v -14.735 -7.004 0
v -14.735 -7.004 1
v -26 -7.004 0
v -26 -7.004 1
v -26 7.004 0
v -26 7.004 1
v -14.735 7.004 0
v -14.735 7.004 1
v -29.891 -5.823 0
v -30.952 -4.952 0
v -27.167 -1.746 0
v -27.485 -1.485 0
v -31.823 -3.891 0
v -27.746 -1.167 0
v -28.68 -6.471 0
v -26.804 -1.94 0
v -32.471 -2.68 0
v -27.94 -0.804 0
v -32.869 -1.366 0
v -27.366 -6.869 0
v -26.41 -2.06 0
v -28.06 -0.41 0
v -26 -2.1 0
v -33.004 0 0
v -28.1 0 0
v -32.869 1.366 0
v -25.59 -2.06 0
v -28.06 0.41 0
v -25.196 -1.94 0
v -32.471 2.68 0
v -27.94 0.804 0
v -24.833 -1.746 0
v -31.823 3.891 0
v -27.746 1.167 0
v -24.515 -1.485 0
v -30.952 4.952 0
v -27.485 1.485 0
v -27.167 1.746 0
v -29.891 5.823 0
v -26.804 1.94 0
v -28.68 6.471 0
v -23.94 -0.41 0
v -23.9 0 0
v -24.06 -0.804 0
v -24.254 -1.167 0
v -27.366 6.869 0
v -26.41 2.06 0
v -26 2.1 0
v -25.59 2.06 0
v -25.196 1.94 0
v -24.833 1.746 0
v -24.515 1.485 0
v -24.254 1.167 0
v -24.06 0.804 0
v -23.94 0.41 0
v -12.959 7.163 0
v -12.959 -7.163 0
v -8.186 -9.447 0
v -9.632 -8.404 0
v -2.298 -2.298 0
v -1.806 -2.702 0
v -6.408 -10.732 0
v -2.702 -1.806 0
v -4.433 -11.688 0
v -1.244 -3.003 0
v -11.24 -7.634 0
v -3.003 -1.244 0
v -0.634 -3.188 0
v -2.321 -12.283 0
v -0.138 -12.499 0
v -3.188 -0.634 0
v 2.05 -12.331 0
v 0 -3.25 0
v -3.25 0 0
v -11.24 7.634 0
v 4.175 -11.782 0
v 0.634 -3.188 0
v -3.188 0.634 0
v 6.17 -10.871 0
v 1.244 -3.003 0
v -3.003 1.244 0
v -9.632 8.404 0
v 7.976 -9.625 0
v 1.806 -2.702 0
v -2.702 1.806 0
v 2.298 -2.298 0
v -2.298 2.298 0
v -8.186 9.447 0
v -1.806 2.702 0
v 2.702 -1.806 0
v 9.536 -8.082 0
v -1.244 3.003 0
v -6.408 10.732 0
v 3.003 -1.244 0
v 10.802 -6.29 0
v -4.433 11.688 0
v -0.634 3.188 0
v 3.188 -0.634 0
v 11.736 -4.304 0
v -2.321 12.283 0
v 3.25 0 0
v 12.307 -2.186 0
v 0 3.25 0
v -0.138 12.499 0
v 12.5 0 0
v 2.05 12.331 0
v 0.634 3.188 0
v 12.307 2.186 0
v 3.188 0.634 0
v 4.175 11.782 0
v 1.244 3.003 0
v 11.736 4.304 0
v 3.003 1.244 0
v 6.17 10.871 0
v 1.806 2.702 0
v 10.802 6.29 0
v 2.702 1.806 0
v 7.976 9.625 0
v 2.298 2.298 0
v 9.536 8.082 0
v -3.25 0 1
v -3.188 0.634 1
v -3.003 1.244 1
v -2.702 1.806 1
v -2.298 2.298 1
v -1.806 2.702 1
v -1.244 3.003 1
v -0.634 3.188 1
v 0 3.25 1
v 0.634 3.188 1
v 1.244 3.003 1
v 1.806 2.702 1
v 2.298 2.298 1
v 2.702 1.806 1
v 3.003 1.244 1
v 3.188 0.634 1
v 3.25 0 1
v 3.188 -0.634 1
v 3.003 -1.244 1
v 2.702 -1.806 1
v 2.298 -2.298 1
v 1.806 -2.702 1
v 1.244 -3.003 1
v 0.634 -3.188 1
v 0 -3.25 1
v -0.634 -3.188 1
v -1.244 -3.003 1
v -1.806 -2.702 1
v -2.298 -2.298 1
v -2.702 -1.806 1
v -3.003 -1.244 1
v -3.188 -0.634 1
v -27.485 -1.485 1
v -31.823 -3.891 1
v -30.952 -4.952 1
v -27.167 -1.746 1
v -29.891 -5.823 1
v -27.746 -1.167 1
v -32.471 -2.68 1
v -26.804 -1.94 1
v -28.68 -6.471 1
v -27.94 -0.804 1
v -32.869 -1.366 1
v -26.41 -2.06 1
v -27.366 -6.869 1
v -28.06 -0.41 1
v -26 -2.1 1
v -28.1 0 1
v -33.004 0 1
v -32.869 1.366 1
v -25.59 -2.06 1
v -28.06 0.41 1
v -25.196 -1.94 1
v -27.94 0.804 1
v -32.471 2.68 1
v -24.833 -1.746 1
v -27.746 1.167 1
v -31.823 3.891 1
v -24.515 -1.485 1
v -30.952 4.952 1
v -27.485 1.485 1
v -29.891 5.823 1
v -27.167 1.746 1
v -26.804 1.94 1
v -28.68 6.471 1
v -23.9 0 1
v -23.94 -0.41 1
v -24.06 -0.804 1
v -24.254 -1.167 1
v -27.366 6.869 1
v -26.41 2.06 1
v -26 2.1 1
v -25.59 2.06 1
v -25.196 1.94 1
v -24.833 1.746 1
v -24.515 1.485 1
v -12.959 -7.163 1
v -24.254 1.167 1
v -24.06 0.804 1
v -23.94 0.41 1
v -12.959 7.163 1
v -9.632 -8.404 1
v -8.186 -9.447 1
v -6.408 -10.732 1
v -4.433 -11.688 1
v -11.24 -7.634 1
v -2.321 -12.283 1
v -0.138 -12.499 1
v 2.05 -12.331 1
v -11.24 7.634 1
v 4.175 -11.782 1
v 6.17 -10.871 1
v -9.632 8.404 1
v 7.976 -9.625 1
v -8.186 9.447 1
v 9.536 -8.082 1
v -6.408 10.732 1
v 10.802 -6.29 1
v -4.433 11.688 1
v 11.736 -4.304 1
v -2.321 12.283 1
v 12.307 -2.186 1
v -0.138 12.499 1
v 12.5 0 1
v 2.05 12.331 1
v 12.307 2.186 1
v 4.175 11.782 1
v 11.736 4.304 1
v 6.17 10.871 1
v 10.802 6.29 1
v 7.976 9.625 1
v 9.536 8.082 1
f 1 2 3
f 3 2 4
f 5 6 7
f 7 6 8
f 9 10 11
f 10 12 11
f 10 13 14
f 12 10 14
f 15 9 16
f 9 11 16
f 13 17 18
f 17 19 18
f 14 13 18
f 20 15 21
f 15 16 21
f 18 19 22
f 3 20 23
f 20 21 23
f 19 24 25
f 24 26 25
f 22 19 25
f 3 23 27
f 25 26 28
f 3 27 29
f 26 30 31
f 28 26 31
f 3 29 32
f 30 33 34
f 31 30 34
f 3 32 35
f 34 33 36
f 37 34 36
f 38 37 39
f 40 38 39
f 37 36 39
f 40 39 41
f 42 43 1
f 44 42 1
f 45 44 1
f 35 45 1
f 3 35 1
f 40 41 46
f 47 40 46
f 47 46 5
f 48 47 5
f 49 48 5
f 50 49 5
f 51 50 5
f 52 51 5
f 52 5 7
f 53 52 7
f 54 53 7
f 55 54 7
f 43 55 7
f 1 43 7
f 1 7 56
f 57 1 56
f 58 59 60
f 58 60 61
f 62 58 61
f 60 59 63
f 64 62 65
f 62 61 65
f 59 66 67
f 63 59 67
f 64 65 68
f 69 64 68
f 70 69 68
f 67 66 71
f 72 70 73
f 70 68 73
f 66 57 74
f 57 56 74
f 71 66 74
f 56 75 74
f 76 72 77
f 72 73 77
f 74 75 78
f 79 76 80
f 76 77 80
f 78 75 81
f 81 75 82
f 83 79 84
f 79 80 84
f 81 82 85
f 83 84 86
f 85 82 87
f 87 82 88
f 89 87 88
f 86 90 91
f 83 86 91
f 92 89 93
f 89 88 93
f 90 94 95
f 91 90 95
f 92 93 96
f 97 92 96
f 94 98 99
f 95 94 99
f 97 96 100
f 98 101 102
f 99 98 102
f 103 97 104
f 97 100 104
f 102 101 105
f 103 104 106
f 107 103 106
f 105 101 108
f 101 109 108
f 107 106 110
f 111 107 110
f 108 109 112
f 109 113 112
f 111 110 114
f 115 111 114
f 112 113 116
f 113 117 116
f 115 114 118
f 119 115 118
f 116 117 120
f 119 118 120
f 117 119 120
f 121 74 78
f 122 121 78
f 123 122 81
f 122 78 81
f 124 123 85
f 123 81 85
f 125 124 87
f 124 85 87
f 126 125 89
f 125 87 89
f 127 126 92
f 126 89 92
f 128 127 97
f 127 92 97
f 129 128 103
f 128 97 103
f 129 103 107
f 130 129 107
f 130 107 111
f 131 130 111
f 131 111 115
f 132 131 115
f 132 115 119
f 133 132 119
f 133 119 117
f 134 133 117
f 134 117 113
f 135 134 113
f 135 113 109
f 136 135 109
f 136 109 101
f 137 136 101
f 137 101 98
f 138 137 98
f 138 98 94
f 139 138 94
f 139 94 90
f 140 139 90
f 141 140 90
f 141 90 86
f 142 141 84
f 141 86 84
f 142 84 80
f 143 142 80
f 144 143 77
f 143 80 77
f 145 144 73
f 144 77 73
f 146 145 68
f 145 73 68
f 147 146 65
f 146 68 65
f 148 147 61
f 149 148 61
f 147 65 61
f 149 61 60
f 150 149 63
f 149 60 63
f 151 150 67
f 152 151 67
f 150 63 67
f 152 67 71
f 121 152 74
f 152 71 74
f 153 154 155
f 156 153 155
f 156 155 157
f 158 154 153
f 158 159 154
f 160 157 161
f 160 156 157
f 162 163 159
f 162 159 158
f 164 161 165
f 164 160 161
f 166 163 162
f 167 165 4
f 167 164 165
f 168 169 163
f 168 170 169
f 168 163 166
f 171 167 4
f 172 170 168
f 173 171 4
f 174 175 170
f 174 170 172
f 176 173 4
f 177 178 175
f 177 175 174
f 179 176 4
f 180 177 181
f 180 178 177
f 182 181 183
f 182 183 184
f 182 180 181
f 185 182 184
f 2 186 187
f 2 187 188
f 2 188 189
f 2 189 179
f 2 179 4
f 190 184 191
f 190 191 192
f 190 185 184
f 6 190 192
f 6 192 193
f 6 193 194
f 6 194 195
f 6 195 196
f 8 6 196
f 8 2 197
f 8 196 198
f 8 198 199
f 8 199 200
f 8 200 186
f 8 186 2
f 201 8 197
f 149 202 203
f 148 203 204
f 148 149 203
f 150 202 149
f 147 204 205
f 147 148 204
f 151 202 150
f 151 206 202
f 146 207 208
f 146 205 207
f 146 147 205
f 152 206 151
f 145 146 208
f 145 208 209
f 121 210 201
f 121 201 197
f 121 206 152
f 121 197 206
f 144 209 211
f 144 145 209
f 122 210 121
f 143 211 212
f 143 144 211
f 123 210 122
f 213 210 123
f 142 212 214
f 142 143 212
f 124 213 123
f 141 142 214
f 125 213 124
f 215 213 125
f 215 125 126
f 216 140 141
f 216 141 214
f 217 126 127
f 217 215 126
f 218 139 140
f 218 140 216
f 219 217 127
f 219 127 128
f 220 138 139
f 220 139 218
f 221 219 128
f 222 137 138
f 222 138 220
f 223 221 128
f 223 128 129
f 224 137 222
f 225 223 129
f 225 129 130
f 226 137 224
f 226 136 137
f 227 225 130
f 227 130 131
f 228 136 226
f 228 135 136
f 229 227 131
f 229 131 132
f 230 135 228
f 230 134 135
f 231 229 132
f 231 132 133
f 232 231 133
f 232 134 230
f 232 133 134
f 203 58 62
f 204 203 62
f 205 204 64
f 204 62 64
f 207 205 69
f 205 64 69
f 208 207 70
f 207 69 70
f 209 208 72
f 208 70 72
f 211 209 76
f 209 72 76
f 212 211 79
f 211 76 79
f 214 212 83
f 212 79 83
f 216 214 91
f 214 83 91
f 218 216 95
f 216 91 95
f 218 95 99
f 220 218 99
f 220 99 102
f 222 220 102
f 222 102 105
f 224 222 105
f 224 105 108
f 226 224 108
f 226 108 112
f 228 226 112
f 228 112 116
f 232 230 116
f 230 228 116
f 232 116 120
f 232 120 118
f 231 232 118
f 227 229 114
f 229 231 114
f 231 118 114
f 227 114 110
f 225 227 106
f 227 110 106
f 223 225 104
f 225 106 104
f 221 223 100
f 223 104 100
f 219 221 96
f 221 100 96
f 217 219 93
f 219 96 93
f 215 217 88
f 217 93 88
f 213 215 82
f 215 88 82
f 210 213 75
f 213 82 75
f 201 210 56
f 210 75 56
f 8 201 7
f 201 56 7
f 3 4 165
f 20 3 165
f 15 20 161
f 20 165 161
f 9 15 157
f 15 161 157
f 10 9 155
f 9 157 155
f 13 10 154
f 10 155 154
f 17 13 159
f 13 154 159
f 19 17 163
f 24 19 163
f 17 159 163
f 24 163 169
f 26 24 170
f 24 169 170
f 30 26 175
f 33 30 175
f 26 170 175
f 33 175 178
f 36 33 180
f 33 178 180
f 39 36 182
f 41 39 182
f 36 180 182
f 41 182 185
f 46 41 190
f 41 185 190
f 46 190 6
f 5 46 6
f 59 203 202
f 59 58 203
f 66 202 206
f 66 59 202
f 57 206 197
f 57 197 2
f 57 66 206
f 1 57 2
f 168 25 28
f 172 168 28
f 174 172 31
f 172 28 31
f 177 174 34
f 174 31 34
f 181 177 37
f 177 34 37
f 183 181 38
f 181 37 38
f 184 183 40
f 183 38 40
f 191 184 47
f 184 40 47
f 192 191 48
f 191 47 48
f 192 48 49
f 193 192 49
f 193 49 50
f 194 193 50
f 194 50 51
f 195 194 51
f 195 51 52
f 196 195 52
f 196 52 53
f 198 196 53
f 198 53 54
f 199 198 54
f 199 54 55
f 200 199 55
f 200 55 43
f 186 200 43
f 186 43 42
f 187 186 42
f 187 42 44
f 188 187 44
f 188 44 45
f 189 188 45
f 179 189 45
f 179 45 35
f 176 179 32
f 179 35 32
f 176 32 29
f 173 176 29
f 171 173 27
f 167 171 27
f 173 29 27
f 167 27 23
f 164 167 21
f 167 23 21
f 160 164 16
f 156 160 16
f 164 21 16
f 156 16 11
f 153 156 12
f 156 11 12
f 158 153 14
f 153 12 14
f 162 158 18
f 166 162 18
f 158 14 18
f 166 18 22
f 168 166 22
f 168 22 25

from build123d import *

# Parameters (mm, degrees)
ESQUISSE1_R                               = 12.5
BOSS_EXTRU_1_DEPTH                        = 1
BOSS_EXTRU_2_DEPTH                        = 1
TROU_POUR_TARAUDAGE_POUR_TROU_TARAUD_M5_D = 4.2
ESQUISSE8_R                               = 3.25
ENL_V_MAT_EXTRU_1_DEPTH                   = 2
CONG_1_R                                  = 10


with BuildPart() as part:
    # Esquisse1 → Boss.-Extru.1 (new body)
    with BuildSketch(Plane.XY):
        Circle(ESQUISSE1_R)
    extrude(amount=BOSS_EXTRU_1_DEPTH)

    # Esquisse4 → Boss.-Extru.2 (add)
    with BuildSketch(Plane.XY.offset(1)):
        with BuildLine():
            Line((-26, 7.00382031), (-10.353574313, 7.00382031))
            ThreePointArc((-10.353574313, 7.00382031), (-12.5, 0), (-10.353574313, -7.00382031))
            Line((-10.353574313, -7.00382031), (-26, -7.00382031))
            ThreePointArc((-26, -7.00382031), (-33.00382031, 0), (-26, 7.00382031))
        make_face()
    extrude(amount=-BOSS_EXTRU_2_DEPTH)

    # Trou pour taraudage pour trou taraudé M52 (through all)
    with Locations(Plane.XY.offset(1)):
        with Locations((-26, 0)):
            Hole(TROU_POUR_TARAUDAGE_POUR_TROU_TARAUD_M5_D / 2)

    # Esquisse8 → Enlèv. mat.-Extru.1 (cut, through all)
    with BuildSketch(Plane(origin=(0, 0, 0), x_dir=(-1, 0, 0), z_dir=(0, 0, -1))):
        Circle(ESQUISSE8_R)
    extrude(amount=-ENL_V_MAT_EXTRU_1_DEPTH, mode=Mode.SUBTRACT)

    # Congé1
    cong_1_edges = [part.edges().sort_by_distance(p)[0] for p in [
        (-10.353574313, 7.00382031, 0.5),
        (-10.353574313, -7.00382031, 0.5),
    ]]
    fillet(cong_1_edges, radius=CONG_1_R)


solid = part.part
